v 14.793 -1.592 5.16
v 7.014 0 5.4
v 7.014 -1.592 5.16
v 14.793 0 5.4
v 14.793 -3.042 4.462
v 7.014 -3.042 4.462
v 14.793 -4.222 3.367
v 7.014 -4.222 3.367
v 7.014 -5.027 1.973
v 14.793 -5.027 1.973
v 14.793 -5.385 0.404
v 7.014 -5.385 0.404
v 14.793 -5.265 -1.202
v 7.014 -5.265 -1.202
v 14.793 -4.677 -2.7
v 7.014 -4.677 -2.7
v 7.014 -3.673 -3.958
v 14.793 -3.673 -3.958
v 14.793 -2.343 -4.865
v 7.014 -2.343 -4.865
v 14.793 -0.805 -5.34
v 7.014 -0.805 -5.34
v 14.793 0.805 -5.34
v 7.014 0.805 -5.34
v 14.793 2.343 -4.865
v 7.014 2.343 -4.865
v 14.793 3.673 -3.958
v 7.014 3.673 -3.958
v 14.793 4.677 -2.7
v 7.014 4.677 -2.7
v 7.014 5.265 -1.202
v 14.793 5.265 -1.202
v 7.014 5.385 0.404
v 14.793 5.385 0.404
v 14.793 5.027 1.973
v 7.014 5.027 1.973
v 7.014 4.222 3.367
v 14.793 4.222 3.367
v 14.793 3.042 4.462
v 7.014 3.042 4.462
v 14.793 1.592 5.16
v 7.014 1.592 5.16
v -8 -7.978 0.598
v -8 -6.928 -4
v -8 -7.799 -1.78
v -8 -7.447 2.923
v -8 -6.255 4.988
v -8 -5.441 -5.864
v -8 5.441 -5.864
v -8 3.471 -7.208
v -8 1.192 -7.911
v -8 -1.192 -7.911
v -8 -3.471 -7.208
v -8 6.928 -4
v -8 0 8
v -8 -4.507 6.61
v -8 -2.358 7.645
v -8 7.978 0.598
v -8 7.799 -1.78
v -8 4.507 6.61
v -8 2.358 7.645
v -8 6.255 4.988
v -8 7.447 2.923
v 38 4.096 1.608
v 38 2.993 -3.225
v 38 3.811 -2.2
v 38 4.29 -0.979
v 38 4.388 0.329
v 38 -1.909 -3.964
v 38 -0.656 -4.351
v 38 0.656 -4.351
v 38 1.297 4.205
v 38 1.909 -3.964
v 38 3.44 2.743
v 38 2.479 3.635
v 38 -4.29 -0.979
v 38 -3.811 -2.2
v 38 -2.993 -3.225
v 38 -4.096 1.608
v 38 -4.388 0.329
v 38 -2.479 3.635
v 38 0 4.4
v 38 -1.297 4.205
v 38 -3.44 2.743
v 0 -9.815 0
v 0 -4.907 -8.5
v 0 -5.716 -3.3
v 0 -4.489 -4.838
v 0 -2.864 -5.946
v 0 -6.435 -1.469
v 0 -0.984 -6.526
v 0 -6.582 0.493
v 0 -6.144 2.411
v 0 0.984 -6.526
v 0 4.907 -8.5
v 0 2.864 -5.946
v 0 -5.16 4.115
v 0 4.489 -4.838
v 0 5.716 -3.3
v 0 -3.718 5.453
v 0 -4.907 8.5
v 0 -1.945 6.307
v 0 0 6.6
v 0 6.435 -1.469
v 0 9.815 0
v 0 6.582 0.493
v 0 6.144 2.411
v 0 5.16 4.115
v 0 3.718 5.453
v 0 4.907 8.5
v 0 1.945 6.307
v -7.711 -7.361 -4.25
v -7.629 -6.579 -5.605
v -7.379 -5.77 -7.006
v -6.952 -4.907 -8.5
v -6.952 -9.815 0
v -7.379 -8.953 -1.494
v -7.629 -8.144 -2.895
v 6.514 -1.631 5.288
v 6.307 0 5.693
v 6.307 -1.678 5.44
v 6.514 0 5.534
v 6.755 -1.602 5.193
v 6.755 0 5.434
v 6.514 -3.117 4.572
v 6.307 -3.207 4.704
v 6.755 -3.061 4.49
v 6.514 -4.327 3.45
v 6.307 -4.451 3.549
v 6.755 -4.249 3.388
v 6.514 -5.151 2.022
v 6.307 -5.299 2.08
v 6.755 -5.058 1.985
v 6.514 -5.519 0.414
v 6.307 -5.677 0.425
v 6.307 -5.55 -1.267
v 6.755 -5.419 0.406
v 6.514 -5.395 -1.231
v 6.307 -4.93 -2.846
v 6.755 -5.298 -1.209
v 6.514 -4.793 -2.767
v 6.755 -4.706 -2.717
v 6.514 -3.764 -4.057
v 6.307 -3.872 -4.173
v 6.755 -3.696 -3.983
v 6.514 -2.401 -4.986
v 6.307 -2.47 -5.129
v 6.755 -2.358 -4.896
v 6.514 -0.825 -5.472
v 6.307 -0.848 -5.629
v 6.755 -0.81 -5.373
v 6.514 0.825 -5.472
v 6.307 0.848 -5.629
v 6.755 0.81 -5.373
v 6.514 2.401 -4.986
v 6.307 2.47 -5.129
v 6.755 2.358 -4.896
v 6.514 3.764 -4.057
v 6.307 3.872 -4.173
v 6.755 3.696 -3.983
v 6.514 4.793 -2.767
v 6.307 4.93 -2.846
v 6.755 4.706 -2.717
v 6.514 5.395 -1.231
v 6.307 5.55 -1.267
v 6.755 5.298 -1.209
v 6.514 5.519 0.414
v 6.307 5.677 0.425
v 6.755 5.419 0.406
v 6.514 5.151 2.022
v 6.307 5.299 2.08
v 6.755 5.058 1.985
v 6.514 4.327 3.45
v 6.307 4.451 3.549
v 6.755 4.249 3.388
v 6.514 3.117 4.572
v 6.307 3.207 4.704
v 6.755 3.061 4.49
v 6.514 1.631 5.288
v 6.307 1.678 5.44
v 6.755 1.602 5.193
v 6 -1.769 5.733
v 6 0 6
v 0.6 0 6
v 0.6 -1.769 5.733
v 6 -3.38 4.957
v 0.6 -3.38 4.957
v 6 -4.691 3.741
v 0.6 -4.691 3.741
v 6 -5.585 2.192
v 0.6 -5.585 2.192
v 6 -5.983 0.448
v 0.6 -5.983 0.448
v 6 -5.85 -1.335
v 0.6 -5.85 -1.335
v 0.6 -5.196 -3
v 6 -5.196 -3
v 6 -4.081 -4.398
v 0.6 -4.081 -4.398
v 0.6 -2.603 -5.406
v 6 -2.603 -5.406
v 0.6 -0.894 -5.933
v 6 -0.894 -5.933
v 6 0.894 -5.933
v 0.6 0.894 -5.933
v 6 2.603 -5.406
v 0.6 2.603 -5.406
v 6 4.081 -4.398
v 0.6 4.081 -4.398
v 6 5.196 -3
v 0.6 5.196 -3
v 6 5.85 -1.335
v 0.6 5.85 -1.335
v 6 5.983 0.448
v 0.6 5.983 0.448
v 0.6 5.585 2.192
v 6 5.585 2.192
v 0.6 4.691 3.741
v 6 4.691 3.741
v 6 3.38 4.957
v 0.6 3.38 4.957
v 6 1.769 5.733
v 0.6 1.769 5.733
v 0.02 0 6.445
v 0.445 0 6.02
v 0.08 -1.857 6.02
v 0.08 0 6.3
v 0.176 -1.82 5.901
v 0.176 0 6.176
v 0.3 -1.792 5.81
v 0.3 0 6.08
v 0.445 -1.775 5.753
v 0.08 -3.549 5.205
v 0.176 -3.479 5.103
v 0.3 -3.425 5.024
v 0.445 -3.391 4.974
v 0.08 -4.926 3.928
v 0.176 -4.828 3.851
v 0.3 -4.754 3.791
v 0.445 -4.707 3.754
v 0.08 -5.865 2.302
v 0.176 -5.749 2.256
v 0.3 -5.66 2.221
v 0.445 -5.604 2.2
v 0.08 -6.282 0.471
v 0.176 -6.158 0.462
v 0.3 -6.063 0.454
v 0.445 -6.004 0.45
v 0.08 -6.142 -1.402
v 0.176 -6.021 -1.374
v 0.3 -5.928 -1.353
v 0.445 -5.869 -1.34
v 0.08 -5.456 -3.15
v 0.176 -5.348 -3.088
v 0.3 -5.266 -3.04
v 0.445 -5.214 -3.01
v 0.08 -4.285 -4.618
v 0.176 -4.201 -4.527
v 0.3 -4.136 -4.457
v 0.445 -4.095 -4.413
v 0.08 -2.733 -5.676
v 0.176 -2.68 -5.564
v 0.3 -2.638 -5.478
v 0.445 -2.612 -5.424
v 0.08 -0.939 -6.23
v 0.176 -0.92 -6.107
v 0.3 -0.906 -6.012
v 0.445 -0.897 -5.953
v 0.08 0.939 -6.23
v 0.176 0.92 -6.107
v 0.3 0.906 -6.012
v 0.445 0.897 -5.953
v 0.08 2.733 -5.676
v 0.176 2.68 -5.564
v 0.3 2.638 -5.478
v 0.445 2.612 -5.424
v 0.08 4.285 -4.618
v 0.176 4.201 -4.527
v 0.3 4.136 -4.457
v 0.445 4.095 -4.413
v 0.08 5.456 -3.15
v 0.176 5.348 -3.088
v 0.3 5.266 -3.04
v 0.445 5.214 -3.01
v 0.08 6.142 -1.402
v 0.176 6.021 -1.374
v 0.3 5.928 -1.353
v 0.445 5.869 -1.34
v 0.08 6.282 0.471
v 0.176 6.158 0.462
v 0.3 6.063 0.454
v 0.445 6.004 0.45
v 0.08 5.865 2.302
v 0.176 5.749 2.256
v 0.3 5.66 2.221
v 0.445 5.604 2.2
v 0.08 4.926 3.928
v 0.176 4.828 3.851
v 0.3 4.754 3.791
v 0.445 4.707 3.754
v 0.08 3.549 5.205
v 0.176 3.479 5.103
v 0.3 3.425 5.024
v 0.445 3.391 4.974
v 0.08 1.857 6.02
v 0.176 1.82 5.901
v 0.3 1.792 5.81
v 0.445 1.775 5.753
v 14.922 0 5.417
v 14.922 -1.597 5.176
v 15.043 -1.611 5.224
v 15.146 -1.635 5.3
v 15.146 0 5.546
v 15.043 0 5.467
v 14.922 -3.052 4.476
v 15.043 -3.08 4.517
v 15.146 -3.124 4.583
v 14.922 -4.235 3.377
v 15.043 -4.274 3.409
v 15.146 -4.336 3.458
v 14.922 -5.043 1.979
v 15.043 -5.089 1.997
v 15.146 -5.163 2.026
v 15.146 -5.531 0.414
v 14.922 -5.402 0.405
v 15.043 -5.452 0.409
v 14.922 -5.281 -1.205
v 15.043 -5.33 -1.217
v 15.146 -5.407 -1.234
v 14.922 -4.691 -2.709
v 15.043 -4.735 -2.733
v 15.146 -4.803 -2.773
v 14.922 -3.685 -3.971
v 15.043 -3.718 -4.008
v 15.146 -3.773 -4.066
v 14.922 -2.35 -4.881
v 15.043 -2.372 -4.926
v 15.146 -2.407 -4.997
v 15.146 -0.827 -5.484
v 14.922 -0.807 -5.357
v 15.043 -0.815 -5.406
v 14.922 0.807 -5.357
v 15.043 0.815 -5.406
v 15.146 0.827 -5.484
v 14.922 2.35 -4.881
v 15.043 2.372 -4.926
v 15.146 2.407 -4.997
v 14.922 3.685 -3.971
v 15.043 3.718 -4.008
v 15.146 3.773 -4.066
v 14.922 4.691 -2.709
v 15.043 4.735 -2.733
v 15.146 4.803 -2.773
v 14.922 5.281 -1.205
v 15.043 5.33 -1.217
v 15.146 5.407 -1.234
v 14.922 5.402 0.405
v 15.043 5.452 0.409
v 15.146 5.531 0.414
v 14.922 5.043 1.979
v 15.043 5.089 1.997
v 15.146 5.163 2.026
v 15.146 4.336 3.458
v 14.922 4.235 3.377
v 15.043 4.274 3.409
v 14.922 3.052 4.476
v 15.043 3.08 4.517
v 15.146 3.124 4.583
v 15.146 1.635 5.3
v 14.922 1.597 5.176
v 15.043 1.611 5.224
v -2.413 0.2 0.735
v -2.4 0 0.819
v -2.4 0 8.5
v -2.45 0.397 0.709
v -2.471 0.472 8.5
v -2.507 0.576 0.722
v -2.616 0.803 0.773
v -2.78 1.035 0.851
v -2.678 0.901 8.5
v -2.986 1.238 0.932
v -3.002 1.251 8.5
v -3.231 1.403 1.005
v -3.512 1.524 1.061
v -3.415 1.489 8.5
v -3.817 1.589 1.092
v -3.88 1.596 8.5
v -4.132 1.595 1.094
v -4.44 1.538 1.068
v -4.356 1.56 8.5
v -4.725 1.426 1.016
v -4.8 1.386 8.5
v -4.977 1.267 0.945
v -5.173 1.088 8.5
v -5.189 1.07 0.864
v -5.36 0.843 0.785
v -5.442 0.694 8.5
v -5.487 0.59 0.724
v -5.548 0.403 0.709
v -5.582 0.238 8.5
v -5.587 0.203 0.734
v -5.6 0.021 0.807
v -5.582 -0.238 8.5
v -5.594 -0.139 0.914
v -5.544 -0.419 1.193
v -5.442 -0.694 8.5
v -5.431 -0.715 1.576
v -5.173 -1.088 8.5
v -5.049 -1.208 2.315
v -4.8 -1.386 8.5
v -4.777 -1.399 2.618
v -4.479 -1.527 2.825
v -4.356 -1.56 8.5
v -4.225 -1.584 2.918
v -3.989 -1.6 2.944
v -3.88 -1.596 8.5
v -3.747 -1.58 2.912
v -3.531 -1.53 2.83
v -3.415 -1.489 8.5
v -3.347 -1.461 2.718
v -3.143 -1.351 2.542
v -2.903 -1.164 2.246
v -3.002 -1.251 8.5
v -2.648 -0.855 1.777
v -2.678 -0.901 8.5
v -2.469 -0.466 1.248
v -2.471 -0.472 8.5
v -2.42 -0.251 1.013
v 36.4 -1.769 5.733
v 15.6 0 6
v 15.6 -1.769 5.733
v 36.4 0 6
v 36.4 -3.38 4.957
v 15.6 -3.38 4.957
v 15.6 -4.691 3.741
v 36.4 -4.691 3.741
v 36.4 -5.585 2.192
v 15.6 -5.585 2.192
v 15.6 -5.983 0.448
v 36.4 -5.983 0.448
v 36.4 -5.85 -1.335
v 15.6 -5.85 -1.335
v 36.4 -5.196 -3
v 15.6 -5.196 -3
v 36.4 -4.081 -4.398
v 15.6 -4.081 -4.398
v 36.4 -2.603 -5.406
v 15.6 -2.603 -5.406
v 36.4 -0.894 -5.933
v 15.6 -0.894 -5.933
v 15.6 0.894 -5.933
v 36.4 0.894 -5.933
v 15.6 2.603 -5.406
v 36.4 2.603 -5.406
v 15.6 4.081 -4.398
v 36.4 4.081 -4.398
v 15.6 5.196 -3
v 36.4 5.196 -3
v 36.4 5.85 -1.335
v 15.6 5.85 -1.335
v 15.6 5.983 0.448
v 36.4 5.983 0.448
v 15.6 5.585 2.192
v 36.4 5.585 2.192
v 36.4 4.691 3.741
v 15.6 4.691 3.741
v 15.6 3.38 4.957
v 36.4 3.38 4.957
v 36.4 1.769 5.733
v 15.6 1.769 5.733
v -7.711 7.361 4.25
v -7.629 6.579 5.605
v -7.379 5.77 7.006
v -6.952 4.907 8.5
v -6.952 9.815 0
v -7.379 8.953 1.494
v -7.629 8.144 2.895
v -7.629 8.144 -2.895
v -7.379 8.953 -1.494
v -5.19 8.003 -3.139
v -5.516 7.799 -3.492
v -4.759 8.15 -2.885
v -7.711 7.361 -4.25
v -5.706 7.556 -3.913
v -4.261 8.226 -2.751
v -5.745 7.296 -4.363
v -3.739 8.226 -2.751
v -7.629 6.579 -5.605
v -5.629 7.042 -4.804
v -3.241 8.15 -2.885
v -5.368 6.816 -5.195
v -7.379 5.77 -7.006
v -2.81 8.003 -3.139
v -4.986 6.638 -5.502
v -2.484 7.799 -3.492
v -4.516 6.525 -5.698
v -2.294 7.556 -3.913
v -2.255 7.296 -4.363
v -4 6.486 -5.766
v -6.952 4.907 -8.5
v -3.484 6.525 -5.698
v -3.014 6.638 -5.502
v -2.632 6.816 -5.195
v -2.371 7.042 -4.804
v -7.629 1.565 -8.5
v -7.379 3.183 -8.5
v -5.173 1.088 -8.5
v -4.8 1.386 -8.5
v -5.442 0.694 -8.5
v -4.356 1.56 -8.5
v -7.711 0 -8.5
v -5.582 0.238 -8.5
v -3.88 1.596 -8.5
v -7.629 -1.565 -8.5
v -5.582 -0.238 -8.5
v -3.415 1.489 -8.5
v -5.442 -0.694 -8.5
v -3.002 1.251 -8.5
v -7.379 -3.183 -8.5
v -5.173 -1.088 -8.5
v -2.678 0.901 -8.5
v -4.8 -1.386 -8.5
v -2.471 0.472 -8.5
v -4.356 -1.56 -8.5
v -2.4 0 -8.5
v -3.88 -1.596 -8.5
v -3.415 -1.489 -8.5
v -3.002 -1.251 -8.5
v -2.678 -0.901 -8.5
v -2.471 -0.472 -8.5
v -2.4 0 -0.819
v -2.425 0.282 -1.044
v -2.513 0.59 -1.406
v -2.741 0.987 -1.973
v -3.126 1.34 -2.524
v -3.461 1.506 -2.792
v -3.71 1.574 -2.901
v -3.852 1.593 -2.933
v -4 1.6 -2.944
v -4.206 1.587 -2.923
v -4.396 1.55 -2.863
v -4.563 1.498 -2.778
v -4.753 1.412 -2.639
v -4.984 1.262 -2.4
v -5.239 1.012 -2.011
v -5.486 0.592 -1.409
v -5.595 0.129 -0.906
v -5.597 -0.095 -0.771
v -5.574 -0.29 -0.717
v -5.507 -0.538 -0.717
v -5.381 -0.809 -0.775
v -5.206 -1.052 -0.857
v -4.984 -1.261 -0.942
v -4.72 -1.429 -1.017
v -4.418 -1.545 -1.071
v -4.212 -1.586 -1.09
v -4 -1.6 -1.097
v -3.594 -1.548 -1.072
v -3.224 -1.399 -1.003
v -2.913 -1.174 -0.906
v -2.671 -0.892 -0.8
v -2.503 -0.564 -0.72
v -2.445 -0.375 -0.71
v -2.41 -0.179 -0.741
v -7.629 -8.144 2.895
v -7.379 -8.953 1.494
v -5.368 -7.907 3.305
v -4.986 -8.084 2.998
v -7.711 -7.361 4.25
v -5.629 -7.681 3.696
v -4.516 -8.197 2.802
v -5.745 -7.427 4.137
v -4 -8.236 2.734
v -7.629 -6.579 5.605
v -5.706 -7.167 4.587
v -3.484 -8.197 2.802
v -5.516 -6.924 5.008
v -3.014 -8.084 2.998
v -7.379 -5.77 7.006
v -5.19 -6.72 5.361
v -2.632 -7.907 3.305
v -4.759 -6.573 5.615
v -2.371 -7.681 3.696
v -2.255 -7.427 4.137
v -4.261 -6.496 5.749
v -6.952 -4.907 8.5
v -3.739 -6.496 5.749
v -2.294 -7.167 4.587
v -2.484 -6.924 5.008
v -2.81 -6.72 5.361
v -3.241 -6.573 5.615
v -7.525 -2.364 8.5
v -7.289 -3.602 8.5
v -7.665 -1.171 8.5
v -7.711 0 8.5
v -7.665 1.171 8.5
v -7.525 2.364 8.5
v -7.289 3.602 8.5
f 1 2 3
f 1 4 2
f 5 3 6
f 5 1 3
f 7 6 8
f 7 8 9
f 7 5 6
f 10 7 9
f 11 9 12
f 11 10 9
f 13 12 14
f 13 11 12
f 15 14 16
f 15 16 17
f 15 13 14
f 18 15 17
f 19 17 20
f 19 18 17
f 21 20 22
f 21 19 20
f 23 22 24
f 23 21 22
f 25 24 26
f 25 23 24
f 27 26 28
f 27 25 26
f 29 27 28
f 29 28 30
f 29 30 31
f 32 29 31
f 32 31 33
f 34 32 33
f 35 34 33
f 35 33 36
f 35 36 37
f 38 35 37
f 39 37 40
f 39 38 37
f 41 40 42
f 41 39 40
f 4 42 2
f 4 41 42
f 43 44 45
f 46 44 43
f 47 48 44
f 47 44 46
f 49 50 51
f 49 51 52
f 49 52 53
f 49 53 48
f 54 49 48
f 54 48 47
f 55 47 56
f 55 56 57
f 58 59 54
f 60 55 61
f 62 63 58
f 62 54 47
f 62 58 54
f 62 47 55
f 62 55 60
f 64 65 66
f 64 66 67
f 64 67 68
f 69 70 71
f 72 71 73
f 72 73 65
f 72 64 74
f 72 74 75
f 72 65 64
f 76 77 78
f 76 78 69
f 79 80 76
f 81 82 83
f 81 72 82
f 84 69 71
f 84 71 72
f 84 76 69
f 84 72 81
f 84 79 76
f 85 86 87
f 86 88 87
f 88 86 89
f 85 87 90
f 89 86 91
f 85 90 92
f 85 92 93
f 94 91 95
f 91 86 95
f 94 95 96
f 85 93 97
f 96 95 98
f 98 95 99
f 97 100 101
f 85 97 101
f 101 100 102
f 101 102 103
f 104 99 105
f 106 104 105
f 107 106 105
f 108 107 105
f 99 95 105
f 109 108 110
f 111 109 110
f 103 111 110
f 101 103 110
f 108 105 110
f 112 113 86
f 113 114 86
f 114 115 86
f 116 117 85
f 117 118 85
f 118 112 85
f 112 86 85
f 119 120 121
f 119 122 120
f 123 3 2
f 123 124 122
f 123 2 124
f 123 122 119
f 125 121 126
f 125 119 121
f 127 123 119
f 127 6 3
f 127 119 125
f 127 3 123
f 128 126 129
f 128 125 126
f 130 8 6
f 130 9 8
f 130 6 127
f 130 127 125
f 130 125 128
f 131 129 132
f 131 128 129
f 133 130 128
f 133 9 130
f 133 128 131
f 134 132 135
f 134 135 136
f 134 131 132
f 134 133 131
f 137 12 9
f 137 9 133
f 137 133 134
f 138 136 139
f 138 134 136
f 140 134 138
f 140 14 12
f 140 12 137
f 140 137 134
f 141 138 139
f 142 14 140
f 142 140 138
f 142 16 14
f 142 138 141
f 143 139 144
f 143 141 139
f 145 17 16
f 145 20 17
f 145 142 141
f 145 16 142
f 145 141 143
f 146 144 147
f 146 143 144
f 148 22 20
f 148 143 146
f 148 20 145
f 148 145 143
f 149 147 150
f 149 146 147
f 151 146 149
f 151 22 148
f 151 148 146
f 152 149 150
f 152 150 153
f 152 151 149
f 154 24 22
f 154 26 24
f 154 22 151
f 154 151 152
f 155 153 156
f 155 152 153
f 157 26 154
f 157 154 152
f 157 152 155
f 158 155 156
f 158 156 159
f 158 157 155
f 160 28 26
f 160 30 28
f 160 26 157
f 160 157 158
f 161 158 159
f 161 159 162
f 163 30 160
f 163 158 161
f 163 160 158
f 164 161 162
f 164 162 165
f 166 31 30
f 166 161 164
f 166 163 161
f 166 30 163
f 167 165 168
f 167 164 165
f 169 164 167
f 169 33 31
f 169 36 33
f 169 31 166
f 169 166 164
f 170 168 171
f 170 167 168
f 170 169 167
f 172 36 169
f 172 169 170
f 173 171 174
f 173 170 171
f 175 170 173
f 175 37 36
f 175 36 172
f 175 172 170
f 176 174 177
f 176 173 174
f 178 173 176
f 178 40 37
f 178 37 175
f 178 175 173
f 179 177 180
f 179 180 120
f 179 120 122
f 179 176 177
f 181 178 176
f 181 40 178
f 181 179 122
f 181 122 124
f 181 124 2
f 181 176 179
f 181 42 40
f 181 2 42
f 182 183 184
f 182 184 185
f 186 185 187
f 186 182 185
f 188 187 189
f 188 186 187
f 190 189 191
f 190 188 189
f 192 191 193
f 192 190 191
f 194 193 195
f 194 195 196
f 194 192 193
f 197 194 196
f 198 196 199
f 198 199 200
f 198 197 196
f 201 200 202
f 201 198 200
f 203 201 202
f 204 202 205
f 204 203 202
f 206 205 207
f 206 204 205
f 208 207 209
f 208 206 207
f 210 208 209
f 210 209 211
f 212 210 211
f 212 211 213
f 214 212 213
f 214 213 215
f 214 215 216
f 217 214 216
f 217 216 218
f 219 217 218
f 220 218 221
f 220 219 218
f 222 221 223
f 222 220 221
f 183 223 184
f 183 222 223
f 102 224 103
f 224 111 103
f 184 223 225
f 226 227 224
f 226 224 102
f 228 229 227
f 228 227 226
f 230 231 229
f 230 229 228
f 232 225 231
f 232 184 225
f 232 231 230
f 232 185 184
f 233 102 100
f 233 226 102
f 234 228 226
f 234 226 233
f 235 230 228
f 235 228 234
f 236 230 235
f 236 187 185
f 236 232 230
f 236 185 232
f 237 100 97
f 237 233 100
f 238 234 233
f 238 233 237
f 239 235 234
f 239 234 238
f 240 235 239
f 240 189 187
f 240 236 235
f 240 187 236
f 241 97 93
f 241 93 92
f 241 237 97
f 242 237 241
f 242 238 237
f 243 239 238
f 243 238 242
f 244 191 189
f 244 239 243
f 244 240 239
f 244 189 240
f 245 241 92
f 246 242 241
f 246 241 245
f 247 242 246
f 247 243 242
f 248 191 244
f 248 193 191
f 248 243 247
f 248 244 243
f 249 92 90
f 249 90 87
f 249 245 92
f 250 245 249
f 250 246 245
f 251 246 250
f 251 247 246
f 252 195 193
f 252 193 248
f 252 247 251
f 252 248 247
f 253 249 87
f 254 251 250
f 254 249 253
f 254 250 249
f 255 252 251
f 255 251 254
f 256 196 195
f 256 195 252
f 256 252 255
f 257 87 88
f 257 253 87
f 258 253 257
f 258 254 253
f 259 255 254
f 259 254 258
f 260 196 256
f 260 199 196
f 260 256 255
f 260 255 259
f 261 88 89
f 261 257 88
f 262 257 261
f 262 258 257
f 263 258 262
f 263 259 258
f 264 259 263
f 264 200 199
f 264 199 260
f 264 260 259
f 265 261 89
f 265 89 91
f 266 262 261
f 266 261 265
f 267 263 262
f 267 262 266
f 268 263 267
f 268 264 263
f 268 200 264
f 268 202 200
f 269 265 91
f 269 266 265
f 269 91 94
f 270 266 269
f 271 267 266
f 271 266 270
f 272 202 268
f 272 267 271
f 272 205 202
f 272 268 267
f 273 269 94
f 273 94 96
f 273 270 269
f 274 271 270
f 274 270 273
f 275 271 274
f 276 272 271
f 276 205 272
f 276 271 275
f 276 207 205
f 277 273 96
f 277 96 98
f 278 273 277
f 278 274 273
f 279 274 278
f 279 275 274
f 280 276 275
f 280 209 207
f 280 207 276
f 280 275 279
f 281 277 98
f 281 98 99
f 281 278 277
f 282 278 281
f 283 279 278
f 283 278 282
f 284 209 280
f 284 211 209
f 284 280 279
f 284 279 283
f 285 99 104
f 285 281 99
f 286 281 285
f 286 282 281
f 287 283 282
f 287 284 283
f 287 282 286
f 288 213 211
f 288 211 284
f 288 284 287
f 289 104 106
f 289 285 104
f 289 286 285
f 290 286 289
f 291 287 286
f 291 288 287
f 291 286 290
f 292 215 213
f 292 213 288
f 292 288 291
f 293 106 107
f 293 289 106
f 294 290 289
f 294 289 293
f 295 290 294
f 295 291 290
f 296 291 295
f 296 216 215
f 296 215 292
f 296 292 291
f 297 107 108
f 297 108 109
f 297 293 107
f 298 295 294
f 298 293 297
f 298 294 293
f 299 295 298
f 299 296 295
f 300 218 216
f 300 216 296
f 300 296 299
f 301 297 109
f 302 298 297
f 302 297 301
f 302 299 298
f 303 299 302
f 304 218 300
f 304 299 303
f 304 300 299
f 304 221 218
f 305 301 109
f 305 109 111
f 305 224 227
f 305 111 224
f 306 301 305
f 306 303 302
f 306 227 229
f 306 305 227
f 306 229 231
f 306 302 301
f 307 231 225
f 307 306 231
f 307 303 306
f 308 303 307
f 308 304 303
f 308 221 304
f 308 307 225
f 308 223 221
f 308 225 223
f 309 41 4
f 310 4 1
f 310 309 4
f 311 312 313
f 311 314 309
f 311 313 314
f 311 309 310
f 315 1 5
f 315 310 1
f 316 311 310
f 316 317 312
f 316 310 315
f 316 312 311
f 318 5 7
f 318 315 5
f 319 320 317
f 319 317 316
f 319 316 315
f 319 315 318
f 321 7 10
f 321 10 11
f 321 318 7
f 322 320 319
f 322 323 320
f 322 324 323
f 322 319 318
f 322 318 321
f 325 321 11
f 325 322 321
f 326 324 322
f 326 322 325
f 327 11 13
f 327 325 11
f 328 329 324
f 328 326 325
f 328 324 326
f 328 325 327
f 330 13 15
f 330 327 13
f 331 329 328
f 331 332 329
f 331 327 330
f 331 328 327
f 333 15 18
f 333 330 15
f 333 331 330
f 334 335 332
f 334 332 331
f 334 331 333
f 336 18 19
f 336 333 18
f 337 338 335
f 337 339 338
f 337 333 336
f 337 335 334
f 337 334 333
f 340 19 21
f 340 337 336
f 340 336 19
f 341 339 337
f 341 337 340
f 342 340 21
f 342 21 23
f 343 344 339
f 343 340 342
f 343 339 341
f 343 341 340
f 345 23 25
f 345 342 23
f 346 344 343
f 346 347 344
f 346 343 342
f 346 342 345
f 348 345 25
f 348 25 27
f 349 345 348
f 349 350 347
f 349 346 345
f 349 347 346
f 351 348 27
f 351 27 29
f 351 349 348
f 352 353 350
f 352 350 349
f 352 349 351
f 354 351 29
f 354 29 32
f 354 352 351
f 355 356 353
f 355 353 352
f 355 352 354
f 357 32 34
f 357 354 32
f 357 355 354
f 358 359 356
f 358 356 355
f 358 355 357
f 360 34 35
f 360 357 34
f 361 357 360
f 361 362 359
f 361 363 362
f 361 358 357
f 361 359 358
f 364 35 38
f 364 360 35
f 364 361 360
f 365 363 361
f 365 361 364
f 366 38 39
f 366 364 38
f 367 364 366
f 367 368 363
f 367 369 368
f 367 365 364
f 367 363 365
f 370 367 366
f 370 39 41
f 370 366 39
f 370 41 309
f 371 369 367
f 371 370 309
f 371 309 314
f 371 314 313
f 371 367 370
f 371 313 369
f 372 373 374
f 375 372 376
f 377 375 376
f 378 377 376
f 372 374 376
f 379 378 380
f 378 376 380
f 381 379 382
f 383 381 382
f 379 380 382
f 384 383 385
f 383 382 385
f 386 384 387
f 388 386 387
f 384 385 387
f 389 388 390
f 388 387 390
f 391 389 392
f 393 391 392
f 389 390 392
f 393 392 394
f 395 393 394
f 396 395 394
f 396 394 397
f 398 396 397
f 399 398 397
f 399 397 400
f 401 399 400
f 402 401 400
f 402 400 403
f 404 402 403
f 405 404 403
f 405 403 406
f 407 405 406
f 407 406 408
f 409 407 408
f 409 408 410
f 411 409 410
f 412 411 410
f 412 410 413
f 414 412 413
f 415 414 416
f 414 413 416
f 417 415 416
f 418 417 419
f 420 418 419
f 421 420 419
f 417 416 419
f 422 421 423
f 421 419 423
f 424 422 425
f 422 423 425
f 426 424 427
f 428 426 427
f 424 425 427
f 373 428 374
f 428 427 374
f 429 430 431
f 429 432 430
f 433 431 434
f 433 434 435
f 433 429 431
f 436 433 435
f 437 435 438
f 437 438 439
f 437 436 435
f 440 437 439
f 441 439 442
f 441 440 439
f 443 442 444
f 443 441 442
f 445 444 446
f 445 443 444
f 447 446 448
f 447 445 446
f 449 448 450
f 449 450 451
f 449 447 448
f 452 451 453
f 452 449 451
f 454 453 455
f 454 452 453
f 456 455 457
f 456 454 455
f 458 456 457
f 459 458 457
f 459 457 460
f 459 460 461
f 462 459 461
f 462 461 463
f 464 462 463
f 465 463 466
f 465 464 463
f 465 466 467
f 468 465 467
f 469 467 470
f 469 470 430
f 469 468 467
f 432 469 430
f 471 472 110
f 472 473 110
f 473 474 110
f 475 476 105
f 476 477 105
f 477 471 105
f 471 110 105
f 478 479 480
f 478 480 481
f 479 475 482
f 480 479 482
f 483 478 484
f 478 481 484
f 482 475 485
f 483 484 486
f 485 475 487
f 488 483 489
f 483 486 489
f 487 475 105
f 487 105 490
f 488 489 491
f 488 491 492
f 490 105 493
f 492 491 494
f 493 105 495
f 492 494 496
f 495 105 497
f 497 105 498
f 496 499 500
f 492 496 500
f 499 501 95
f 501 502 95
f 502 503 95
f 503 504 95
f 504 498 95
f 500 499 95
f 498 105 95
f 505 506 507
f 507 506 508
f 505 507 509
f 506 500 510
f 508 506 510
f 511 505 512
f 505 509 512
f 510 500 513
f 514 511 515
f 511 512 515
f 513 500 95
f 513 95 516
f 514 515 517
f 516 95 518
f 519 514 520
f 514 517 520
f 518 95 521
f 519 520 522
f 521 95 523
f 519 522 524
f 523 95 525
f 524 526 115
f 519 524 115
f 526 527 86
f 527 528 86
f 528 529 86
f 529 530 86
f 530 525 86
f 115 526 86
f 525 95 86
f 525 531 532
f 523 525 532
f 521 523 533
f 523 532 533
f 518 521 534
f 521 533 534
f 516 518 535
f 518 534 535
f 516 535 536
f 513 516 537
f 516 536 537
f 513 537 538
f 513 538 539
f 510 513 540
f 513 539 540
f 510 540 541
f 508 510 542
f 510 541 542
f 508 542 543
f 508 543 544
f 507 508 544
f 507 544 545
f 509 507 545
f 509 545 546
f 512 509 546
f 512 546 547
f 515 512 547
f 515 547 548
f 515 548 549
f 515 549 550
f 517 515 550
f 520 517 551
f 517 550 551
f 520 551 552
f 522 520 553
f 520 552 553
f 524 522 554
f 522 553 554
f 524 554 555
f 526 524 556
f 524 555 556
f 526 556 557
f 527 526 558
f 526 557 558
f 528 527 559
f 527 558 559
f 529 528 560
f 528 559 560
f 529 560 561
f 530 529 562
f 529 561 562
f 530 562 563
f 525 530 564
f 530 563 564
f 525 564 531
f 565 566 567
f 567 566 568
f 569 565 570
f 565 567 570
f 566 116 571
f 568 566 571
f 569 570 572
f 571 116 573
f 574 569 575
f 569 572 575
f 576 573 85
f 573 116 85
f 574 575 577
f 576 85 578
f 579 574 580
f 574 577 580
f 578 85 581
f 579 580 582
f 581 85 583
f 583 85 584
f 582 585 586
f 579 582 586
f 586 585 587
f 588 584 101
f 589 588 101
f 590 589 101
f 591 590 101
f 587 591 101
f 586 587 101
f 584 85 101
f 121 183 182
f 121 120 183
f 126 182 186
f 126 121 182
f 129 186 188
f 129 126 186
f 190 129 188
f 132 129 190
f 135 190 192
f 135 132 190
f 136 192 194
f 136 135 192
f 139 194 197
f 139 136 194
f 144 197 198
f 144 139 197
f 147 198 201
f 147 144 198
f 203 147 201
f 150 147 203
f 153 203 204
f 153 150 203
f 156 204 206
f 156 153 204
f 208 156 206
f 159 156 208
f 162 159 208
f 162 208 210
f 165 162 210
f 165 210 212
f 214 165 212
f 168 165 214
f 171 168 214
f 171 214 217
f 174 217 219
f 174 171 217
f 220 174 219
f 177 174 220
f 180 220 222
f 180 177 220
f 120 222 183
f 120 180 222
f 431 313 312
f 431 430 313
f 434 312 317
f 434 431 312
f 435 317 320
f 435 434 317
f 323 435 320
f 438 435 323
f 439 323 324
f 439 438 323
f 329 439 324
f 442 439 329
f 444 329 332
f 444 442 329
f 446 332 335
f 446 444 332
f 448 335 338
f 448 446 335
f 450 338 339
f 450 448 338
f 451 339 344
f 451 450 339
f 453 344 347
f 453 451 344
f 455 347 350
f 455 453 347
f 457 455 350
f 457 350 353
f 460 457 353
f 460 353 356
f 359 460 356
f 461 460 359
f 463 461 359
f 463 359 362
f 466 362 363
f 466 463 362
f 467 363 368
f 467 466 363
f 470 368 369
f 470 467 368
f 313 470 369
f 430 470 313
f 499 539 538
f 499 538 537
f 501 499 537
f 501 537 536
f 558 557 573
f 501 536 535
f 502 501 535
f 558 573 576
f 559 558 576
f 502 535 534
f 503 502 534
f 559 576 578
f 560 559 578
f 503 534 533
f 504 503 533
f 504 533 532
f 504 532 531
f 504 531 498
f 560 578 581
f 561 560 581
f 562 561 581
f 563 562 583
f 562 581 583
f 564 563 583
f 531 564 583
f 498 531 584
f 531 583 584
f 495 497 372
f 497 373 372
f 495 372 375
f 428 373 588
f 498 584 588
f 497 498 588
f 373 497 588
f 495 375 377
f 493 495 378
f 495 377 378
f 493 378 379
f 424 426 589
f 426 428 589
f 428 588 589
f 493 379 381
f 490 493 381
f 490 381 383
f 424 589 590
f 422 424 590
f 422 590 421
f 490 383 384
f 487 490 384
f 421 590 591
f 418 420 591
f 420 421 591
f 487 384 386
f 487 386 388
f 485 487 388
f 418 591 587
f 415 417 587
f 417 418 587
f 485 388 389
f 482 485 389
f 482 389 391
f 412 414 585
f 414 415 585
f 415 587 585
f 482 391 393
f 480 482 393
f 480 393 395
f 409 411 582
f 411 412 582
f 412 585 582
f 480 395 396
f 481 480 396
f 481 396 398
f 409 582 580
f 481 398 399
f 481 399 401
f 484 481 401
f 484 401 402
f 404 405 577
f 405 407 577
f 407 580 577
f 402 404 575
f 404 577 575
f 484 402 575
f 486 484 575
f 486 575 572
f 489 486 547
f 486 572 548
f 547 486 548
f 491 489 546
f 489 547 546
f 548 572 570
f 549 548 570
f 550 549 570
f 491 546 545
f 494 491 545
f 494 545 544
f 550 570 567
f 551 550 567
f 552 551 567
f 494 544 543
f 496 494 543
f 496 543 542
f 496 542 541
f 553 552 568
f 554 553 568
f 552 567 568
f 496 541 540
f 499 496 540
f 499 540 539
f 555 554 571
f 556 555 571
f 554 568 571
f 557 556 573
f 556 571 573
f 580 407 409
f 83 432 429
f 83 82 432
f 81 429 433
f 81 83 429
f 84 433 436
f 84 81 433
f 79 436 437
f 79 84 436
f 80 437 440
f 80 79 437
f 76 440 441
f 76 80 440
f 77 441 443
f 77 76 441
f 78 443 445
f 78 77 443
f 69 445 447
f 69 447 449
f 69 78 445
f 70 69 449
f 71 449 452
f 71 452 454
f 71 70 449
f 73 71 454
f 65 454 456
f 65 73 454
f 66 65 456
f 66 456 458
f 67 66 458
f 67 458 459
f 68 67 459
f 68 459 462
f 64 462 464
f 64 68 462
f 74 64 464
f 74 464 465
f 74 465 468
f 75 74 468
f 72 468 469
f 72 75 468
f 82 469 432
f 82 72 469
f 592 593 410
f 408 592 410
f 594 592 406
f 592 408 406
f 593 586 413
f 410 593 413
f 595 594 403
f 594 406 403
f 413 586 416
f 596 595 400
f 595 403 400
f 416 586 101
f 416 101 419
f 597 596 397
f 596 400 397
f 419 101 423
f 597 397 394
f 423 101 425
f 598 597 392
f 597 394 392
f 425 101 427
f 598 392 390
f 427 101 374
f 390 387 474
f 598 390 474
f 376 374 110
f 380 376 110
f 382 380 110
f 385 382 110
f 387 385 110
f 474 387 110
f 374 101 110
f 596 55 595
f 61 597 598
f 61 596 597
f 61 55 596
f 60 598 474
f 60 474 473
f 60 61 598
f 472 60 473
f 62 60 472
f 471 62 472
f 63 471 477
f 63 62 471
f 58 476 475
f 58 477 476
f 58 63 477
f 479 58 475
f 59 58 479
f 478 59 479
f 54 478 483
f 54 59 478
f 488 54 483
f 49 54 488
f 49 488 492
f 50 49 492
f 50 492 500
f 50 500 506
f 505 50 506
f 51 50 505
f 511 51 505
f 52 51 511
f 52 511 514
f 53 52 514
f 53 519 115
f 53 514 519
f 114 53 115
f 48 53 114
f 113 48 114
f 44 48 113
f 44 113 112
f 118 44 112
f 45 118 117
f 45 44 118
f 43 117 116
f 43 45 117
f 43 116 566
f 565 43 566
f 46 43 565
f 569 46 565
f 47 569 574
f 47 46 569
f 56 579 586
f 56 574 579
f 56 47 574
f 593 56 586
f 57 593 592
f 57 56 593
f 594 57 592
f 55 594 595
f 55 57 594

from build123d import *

# Parameters (mm, degrees)
EXTRUDE_1_DEPTH     = 8
SKETCH_3_OUTSIDE_W  = 198.604
SKETCH_3_OUTSIDE_H  = 201.234
SKETCH_3_OUTSIDE_R  = 8
CUT_EXTRUDE_1_DEPTH = 48.797315127
CUT_EXTRUDE_1_DRAFT = -60
FILLET_1_R          = 0.6
SKETCH_4_R          = 1.6
CUT_EXTRUDE_2_DEPTH = 43.770706486
SKETCH_5_R          = 1.75
CUT_EXTRUDE_3_DEPTH = 44.607147732


with BuildPart() as part:
    # Эскиз1 → Повернуть1 (revolve)
    with BuildSketch(Plane.XY, mode=Mode.PRIVATE) as revolve_1_sk:
        with BuildLine():
            Line((0, 0), (0, 6))
            Line((0, 6), (6, 6))
            Line((6, 6), (6.307106781, 5.692893219))
            ThreePointArc((6.307106781, 5.692893219), (6.63153013, 5.476120467), (7.014213562, 5.4))
            Line((7.014213562, 5.4), (14.792893219, 5.4))
            ThreePointArc((14.792893219, 5.4), (14.984234935, 5.438060234), (15.146446609, 5.546446609))
            Line((15.146446609, 5.546446609), (15.6, 6))
            Line((15.6, 6), (36.4, 6))
            Line((36.4, 6), (38, 4.4))
            Line((38, 4.4), (38, 0))
            Line((38, 0), (0, 0))
        make_face()
    revolve(revolve_1_sk.sketch.rotate(Axis((0, 0, 0), (1, 0, 0)), 90), axis=Axis((0, 0, 0), (1, 0, 0)))

    # Эскиз2 → Бобышка-Вытянуть1 (add)
    with BuildSketch(Plane.ZY):
        Polygon((0, -9.814954576), (8.5, -4.907477288), (8.5, 4.907477288), (0, 9.814954576), (-8.5, 4.907477288), (-8.5, -4.907477288), align=None)
    extrude(amount=EXTRUDE_1_DEPTH)


with BuildPart() as cut_extrude_1_tool:
    # Эскиз3 outside → Вырез-Вытянуть1 (with draft: the straight prism first)
    with BuildSketch(Plane.ZY.offset(8)):
        Rectangle(SKETCH_3_OUTSIDE_W, SKETCH_3_OUTSIDE_H)
        Circle(SKETCH_3_OUTSIDE_R, mode=Mode.SUBTRACT)
    extrude(amount=-CUT_EXTRUDE_1_DEPTH)
    # Вырез-Вытянуть1: the draft: its side faces are tilted about the plane it starts from
    cut_extrude_1_sides = [cut_extrude_1_tool.faces().sort_by_distance(p)[0] for p in [
        (16.398657563, -100.617, 0),
        (16.398657563, 0, 99.302),
        (16.398657563, 100.617, 0),
        (16.398657563, 0, -99.302),
        (16.398657563, 0, -8),
    ]]
    draft(cut_extrude_1_sides, Plane.ZY.offset(8), CUT_EXTRUDE_1_DRAFT)


with BuildPart() as part_1:
    add(part.part)

    # Вырез-Вытянуть1: cut by cut_extrude_1_tool
    add(cut_extrude_1_tool.part, mode=Mode.SUBTRACT)

    # Скругление1
    fillet_1_edges = [part_1.edges().sort_by_distance(p)[0] for p in [
        (0, 0, -6),
    ]]
    fillet(fillet_1_edges, radius=FILLET_1_R)

    # Эскиз4 → Вырез-Вытянуть2 (cut, through all)
    with BuildSketch(Plane.XY.offset(8.5)):
        with Locations((-4, 0)):
            Circle(SKETCH_4_R)
    extrude(amount=-CUT_EXTRUDE_2_DEPTH, mode=Mode.SUBTRACT)

    # Эскиз5 → Вырез-Вытянуть3 (cut, through all)
    with BuildSketch(Plane(origin=(0, -7.361215932, 4.25), x_dir=(1, 0, 0), z_dir=(0, -0.8660254037844384, 0.5000000000000003))):
        with Locations(Location((-4, 0, 0), (0, 0, 270))):
            Circle(SKETCH_5_R)
    extrude(amount=-CUT_EXTRUDE_3_DEPTH, mode=Mode.SUBTRACT)


solid = part_1.part
